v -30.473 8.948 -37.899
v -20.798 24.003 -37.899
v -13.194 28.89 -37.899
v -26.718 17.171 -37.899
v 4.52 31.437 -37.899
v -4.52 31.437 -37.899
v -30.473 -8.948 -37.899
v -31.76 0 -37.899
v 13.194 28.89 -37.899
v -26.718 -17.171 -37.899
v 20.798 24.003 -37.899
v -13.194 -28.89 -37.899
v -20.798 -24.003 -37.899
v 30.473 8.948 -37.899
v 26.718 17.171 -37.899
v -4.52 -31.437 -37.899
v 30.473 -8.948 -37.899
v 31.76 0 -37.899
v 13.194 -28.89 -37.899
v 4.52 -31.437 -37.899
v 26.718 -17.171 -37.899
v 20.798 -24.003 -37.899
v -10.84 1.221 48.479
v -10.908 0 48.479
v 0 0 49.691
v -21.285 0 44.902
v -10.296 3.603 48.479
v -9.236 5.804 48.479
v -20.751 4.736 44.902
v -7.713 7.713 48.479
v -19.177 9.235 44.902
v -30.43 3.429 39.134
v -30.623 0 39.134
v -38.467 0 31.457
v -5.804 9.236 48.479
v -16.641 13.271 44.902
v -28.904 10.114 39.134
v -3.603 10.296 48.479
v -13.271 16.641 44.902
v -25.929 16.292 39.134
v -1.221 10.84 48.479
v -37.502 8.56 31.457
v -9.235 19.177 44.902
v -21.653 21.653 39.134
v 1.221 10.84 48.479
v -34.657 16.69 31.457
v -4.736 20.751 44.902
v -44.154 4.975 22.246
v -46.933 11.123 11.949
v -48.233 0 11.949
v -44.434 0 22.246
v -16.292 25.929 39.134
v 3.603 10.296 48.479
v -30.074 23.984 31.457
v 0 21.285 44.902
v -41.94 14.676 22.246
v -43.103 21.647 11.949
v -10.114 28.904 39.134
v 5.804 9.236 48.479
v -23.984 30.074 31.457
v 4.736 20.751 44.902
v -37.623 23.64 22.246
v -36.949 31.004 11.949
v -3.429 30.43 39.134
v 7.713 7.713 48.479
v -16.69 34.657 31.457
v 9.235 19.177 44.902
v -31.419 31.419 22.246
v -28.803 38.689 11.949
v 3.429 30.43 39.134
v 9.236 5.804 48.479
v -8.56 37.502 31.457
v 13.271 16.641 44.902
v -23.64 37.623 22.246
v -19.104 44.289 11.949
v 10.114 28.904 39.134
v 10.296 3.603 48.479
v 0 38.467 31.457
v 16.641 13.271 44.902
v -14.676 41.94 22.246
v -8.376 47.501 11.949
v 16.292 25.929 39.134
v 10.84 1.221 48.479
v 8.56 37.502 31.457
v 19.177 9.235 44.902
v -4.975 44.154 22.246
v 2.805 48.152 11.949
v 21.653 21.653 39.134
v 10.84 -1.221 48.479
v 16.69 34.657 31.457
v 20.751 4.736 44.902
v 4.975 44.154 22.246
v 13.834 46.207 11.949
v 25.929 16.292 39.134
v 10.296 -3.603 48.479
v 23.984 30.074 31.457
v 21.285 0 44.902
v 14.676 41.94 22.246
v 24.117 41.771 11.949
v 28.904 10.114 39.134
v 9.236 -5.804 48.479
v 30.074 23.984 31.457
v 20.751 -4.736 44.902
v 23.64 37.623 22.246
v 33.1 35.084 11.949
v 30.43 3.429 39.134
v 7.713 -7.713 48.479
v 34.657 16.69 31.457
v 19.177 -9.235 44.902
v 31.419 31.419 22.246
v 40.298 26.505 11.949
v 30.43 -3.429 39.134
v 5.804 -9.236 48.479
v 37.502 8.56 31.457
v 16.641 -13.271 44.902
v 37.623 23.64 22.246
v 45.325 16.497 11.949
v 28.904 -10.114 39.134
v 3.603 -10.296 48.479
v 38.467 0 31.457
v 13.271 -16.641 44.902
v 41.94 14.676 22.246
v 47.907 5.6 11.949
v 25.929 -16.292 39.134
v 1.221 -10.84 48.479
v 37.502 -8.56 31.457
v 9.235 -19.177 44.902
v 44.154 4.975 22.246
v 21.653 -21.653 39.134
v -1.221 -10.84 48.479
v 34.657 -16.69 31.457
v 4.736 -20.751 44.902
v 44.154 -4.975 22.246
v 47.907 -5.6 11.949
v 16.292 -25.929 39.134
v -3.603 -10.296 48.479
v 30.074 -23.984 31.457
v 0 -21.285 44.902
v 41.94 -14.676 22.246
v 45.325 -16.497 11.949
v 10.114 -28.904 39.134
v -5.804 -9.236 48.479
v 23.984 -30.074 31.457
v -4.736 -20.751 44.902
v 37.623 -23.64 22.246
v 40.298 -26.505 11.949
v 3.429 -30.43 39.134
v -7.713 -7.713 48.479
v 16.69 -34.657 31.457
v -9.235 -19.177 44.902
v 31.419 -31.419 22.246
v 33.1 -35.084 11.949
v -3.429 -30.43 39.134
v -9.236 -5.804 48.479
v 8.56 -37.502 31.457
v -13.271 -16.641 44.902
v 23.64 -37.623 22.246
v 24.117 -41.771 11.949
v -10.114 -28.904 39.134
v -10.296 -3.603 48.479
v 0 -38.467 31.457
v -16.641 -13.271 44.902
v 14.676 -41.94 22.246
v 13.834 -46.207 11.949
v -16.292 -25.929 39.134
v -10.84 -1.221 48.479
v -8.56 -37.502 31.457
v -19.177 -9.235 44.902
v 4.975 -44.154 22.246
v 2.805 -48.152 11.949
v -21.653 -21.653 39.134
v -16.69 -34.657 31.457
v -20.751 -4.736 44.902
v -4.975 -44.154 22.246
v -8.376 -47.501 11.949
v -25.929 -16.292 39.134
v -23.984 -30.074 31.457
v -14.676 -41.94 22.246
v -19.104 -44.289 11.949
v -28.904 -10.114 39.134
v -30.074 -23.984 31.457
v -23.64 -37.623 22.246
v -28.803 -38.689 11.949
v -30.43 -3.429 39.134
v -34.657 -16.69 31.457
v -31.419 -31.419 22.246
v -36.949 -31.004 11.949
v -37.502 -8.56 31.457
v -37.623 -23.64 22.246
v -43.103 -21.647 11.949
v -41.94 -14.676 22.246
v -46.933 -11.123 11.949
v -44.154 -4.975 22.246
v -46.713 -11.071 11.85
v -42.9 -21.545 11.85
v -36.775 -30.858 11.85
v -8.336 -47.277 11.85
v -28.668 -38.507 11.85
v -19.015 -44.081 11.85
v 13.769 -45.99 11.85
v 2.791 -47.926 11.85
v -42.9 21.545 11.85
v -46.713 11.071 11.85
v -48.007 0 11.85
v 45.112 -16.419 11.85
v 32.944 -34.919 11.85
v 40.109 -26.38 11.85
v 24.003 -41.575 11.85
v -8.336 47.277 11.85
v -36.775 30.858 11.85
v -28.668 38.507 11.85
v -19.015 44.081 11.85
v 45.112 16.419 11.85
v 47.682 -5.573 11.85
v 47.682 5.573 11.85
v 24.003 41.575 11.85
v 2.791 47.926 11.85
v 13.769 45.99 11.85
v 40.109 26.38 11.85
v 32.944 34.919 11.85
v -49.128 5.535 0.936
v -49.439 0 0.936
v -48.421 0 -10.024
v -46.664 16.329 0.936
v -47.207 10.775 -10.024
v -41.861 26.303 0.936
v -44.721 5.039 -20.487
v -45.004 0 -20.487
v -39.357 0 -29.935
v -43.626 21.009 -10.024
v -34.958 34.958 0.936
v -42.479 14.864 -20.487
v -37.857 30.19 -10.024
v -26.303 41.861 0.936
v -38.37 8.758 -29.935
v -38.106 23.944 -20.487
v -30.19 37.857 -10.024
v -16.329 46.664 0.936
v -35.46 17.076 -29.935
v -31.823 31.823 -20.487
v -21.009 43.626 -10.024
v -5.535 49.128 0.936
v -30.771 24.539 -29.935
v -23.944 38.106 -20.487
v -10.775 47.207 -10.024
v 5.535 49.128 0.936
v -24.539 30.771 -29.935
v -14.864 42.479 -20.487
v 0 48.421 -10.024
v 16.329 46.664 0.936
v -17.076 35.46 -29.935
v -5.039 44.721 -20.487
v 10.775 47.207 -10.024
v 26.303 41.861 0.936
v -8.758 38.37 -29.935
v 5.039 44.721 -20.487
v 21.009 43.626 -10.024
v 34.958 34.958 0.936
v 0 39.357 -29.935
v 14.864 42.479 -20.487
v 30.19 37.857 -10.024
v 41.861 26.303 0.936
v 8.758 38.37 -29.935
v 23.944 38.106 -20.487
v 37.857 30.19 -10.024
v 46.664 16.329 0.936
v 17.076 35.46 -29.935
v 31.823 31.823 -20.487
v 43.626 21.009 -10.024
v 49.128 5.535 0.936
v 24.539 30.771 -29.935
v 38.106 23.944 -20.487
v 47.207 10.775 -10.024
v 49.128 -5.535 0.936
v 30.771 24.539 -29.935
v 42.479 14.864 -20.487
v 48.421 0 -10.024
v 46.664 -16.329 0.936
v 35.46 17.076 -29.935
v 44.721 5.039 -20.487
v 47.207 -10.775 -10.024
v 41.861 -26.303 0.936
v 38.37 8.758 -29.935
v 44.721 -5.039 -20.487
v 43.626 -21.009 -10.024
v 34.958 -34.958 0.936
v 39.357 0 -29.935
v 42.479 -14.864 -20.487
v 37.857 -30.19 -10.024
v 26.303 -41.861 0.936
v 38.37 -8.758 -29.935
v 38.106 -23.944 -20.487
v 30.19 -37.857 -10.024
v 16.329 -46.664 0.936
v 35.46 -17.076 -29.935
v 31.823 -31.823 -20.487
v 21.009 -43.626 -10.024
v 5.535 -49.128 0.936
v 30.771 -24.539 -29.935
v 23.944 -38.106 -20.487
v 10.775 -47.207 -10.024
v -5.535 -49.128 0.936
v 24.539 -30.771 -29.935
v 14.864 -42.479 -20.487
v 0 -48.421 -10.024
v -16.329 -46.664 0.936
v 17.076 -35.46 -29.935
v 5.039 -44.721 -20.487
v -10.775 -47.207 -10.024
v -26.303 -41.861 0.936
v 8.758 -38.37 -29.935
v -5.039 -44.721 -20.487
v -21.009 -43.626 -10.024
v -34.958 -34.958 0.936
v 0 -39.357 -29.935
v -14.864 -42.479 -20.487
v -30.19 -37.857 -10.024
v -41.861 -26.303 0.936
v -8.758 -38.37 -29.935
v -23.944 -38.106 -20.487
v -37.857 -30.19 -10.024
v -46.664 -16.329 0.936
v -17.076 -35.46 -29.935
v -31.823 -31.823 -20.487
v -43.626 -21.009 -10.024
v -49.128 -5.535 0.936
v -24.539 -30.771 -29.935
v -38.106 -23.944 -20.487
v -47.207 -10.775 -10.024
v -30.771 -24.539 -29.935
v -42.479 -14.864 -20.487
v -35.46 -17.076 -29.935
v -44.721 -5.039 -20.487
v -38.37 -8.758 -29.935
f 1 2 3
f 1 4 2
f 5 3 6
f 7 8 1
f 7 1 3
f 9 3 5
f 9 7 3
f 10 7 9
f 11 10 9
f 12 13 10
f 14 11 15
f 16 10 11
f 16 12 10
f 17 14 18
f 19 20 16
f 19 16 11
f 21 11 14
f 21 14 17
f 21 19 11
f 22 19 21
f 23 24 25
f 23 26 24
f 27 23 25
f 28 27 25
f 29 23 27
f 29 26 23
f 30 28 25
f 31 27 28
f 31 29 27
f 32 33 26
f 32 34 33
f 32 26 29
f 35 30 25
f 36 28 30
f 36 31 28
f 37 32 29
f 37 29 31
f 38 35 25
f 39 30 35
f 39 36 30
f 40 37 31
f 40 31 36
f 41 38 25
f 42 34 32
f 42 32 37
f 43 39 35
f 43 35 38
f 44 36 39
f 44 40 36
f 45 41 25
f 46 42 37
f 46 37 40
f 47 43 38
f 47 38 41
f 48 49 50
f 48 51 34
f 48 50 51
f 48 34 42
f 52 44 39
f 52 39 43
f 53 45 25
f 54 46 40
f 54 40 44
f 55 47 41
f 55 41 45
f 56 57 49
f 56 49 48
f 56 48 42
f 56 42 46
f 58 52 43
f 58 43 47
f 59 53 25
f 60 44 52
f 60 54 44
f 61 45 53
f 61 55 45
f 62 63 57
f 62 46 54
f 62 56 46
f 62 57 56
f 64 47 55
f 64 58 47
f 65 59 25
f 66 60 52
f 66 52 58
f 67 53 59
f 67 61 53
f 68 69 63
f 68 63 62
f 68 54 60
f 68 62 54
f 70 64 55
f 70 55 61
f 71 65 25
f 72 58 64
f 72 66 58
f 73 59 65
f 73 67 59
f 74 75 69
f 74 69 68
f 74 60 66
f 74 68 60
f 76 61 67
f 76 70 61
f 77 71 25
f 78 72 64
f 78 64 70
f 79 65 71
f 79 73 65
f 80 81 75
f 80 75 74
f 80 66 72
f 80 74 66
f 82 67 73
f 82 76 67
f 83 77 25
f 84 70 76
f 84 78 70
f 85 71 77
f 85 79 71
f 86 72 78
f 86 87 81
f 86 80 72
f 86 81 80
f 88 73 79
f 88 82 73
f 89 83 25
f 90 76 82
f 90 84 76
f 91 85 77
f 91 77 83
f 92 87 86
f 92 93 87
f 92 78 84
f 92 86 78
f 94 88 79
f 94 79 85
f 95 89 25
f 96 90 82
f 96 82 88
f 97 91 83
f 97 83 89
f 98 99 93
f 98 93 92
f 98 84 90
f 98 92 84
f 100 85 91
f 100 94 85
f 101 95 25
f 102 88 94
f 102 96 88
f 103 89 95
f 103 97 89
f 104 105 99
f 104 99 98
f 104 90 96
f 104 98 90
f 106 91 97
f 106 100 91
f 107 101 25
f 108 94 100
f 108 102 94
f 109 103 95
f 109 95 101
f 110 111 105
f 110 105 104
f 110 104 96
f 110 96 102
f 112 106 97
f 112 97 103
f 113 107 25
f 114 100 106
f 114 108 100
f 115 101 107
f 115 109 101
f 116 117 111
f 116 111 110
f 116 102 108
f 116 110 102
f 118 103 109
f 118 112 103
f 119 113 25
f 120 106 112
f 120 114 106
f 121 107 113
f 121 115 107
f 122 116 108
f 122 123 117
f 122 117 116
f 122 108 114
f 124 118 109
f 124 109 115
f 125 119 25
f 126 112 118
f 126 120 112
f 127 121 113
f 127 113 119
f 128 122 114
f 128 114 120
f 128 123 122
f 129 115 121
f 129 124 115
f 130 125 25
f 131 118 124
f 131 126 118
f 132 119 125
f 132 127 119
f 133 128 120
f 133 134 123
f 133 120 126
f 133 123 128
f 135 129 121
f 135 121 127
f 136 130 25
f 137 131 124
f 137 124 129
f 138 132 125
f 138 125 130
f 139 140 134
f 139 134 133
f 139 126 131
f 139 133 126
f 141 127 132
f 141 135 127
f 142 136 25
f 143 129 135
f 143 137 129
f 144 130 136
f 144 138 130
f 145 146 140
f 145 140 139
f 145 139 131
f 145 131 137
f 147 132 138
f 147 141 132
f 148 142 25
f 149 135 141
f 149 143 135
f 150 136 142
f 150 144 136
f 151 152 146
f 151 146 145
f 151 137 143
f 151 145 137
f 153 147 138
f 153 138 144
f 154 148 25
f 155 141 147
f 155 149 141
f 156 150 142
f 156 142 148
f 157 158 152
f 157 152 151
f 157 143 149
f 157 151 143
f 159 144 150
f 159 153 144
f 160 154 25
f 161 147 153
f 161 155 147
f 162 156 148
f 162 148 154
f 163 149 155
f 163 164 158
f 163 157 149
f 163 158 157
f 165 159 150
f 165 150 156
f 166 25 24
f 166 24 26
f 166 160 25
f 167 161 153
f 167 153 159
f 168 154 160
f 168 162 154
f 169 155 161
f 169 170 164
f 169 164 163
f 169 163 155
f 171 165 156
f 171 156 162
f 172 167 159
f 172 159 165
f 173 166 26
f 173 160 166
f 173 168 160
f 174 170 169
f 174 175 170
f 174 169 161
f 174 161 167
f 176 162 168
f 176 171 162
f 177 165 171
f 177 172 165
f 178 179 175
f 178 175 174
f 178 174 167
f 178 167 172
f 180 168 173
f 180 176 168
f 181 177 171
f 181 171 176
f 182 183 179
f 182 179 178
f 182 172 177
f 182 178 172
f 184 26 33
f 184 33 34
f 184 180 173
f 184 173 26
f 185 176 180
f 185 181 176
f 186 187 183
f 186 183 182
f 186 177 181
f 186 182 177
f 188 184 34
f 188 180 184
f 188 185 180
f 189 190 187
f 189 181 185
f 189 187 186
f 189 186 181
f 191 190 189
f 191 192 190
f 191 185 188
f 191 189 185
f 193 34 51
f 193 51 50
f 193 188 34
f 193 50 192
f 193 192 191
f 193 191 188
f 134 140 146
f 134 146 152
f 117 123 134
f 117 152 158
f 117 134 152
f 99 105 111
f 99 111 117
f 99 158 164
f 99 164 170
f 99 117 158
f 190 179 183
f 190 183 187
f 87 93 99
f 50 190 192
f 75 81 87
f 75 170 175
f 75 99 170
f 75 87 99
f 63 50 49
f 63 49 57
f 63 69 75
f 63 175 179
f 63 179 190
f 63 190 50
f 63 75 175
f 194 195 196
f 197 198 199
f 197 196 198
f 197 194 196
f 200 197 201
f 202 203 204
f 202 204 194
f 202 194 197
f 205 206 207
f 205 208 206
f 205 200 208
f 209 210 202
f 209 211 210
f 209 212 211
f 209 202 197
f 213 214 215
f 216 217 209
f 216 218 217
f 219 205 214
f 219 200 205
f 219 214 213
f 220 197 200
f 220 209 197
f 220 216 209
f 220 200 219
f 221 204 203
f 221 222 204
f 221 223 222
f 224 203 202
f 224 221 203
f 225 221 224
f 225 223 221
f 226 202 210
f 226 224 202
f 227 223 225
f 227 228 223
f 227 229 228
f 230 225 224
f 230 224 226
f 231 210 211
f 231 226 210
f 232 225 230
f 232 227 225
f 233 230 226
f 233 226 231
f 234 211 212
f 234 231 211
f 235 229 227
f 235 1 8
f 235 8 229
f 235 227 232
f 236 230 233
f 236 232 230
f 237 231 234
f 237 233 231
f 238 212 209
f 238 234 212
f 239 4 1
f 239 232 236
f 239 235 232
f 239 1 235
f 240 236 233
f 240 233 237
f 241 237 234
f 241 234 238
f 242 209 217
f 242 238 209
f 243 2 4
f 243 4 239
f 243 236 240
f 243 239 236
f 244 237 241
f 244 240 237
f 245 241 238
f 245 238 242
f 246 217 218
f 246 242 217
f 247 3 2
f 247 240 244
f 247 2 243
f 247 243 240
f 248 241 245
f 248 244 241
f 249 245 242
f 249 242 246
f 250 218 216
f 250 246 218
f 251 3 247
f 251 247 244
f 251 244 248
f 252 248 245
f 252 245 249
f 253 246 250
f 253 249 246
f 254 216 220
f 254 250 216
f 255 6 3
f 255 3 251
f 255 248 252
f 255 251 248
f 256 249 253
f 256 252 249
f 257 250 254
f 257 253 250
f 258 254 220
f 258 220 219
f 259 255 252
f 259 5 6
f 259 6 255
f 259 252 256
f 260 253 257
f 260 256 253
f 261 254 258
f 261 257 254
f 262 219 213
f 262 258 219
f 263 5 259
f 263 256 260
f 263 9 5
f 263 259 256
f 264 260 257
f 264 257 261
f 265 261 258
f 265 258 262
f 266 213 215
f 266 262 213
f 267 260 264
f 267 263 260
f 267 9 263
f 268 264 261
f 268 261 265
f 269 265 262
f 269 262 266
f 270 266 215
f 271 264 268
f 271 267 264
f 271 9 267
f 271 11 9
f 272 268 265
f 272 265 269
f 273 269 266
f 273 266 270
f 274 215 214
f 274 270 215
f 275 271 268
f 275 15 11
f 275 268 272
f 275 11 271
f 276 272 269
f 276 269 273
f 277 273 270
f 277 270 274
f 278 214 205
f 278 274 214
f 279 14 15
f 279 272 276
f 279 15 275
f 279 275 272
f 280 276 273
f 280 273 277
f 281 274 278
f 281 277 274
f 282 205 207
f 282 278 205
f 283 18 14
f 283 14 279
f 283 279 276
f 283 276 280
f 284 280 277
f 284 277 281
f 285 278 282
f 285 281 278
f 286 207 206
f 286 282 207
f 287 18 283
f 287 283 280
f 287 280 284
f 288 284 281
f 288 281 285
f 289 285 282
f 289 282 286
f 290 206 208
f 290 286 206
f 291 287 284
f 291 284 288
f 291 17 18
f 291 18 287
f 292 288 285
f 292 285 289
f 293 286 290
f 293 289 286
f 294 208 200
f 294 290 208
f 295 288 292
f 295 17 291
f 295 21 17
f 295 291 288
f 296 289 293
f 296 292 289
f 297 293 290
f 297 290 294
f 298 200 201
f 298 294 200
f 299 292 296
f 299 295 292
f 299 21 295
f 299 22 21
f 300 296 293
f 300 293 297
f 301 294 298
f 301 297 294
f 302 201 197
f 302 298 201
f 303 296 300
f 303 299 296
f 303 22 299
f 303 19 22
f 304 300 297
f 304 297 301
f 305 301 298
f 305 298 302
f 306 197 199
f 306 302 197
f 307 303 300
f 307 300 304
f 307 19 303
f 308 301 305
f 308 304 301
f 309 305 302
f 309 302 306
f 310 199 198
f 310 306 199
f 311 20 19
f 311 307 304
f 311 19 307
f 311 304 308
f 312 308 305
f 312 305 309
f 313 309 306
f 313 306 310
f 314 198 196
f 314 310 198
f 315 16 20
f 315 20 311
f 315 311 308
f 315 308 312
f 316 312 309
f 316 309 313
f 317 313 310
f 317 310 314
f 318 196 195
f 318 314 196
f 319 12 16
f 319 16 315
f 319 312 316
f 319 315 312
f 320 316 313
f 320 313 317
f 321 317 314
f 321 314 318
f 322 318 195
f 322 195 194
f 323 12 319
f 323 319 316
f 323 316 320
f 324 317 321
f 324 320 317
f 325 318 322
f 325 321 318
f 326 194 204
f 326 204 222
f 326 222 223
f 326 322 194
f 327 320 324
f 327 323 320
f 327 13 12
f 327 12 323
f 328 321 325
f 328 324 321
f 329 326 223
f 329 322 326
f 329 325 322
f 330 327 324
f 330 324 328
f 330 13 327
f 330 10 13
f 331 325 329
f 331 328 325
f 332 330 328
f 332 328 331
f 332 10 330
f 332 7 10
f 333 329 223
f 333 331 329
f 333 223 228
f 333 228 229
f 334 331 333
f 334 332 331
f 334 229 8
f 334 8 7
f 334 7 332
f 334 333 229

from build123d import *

# Parameters (mm, degrees)
F4_W          = 68.7478817999
F4_H          = 17.0400701463
F5_DEPTH      = 52.53746
F5_DEPTH_BACK = 51.57175


with BuildPart() as f1:
    # F0 (on Front) → F1 (revolve)
    with BuildSketch(Plane.XZ):
        with BuildLine():
            Line((0, 11.9486989786), (0, 49.6914120428))
            ThreePointArc((0, 49.6914120428), (-30.6226117966, 39.1342826377), (-48.2334429989, 11.9486989786))
            Line((-48.2334429989, 11.9486989786), (0, 11.9486989786))
        make_face()
    revolve(axis=Axis((0, 0, 30.8200555107), (0, 0, -1)))


with BuildPart() as f3:
    # F2 (on Front) → F3 (revolve)
    with BuildSketch(Plane.XZ):
        with BuildLine():
            ThreePointArc((-48.0067932728, 11.8497069925), (-38.9294723854, -30.4887509738), (0, -49.4476263955))
            Line((0, -49.4476263955), (0, 11.8497069925))
            Line((0, 11.8497069925), (-48.0067932728, 11.8497069925))
        make_face()
    revolve(axis=Axis((0, 0, -18.7989597015), (0, 0, -1)))

    # F4 (on Front) → F5 (cut, two sides)
    with BuildSketch(Plane.XZ) as f5_sk:
        with Locations((0.4896577448, -46.4195106179)):
            Rectangle(F4_W, F4_H)
    extrude(amount=-F5_DEPTH, mode=Mode.SUBTRACT)
    extrude(f5_sk.sketch, amount=F5_DEPTH_BACK, mode=Mode.SUBTRACT)


solid = Compound([f1.part, f3.part])
